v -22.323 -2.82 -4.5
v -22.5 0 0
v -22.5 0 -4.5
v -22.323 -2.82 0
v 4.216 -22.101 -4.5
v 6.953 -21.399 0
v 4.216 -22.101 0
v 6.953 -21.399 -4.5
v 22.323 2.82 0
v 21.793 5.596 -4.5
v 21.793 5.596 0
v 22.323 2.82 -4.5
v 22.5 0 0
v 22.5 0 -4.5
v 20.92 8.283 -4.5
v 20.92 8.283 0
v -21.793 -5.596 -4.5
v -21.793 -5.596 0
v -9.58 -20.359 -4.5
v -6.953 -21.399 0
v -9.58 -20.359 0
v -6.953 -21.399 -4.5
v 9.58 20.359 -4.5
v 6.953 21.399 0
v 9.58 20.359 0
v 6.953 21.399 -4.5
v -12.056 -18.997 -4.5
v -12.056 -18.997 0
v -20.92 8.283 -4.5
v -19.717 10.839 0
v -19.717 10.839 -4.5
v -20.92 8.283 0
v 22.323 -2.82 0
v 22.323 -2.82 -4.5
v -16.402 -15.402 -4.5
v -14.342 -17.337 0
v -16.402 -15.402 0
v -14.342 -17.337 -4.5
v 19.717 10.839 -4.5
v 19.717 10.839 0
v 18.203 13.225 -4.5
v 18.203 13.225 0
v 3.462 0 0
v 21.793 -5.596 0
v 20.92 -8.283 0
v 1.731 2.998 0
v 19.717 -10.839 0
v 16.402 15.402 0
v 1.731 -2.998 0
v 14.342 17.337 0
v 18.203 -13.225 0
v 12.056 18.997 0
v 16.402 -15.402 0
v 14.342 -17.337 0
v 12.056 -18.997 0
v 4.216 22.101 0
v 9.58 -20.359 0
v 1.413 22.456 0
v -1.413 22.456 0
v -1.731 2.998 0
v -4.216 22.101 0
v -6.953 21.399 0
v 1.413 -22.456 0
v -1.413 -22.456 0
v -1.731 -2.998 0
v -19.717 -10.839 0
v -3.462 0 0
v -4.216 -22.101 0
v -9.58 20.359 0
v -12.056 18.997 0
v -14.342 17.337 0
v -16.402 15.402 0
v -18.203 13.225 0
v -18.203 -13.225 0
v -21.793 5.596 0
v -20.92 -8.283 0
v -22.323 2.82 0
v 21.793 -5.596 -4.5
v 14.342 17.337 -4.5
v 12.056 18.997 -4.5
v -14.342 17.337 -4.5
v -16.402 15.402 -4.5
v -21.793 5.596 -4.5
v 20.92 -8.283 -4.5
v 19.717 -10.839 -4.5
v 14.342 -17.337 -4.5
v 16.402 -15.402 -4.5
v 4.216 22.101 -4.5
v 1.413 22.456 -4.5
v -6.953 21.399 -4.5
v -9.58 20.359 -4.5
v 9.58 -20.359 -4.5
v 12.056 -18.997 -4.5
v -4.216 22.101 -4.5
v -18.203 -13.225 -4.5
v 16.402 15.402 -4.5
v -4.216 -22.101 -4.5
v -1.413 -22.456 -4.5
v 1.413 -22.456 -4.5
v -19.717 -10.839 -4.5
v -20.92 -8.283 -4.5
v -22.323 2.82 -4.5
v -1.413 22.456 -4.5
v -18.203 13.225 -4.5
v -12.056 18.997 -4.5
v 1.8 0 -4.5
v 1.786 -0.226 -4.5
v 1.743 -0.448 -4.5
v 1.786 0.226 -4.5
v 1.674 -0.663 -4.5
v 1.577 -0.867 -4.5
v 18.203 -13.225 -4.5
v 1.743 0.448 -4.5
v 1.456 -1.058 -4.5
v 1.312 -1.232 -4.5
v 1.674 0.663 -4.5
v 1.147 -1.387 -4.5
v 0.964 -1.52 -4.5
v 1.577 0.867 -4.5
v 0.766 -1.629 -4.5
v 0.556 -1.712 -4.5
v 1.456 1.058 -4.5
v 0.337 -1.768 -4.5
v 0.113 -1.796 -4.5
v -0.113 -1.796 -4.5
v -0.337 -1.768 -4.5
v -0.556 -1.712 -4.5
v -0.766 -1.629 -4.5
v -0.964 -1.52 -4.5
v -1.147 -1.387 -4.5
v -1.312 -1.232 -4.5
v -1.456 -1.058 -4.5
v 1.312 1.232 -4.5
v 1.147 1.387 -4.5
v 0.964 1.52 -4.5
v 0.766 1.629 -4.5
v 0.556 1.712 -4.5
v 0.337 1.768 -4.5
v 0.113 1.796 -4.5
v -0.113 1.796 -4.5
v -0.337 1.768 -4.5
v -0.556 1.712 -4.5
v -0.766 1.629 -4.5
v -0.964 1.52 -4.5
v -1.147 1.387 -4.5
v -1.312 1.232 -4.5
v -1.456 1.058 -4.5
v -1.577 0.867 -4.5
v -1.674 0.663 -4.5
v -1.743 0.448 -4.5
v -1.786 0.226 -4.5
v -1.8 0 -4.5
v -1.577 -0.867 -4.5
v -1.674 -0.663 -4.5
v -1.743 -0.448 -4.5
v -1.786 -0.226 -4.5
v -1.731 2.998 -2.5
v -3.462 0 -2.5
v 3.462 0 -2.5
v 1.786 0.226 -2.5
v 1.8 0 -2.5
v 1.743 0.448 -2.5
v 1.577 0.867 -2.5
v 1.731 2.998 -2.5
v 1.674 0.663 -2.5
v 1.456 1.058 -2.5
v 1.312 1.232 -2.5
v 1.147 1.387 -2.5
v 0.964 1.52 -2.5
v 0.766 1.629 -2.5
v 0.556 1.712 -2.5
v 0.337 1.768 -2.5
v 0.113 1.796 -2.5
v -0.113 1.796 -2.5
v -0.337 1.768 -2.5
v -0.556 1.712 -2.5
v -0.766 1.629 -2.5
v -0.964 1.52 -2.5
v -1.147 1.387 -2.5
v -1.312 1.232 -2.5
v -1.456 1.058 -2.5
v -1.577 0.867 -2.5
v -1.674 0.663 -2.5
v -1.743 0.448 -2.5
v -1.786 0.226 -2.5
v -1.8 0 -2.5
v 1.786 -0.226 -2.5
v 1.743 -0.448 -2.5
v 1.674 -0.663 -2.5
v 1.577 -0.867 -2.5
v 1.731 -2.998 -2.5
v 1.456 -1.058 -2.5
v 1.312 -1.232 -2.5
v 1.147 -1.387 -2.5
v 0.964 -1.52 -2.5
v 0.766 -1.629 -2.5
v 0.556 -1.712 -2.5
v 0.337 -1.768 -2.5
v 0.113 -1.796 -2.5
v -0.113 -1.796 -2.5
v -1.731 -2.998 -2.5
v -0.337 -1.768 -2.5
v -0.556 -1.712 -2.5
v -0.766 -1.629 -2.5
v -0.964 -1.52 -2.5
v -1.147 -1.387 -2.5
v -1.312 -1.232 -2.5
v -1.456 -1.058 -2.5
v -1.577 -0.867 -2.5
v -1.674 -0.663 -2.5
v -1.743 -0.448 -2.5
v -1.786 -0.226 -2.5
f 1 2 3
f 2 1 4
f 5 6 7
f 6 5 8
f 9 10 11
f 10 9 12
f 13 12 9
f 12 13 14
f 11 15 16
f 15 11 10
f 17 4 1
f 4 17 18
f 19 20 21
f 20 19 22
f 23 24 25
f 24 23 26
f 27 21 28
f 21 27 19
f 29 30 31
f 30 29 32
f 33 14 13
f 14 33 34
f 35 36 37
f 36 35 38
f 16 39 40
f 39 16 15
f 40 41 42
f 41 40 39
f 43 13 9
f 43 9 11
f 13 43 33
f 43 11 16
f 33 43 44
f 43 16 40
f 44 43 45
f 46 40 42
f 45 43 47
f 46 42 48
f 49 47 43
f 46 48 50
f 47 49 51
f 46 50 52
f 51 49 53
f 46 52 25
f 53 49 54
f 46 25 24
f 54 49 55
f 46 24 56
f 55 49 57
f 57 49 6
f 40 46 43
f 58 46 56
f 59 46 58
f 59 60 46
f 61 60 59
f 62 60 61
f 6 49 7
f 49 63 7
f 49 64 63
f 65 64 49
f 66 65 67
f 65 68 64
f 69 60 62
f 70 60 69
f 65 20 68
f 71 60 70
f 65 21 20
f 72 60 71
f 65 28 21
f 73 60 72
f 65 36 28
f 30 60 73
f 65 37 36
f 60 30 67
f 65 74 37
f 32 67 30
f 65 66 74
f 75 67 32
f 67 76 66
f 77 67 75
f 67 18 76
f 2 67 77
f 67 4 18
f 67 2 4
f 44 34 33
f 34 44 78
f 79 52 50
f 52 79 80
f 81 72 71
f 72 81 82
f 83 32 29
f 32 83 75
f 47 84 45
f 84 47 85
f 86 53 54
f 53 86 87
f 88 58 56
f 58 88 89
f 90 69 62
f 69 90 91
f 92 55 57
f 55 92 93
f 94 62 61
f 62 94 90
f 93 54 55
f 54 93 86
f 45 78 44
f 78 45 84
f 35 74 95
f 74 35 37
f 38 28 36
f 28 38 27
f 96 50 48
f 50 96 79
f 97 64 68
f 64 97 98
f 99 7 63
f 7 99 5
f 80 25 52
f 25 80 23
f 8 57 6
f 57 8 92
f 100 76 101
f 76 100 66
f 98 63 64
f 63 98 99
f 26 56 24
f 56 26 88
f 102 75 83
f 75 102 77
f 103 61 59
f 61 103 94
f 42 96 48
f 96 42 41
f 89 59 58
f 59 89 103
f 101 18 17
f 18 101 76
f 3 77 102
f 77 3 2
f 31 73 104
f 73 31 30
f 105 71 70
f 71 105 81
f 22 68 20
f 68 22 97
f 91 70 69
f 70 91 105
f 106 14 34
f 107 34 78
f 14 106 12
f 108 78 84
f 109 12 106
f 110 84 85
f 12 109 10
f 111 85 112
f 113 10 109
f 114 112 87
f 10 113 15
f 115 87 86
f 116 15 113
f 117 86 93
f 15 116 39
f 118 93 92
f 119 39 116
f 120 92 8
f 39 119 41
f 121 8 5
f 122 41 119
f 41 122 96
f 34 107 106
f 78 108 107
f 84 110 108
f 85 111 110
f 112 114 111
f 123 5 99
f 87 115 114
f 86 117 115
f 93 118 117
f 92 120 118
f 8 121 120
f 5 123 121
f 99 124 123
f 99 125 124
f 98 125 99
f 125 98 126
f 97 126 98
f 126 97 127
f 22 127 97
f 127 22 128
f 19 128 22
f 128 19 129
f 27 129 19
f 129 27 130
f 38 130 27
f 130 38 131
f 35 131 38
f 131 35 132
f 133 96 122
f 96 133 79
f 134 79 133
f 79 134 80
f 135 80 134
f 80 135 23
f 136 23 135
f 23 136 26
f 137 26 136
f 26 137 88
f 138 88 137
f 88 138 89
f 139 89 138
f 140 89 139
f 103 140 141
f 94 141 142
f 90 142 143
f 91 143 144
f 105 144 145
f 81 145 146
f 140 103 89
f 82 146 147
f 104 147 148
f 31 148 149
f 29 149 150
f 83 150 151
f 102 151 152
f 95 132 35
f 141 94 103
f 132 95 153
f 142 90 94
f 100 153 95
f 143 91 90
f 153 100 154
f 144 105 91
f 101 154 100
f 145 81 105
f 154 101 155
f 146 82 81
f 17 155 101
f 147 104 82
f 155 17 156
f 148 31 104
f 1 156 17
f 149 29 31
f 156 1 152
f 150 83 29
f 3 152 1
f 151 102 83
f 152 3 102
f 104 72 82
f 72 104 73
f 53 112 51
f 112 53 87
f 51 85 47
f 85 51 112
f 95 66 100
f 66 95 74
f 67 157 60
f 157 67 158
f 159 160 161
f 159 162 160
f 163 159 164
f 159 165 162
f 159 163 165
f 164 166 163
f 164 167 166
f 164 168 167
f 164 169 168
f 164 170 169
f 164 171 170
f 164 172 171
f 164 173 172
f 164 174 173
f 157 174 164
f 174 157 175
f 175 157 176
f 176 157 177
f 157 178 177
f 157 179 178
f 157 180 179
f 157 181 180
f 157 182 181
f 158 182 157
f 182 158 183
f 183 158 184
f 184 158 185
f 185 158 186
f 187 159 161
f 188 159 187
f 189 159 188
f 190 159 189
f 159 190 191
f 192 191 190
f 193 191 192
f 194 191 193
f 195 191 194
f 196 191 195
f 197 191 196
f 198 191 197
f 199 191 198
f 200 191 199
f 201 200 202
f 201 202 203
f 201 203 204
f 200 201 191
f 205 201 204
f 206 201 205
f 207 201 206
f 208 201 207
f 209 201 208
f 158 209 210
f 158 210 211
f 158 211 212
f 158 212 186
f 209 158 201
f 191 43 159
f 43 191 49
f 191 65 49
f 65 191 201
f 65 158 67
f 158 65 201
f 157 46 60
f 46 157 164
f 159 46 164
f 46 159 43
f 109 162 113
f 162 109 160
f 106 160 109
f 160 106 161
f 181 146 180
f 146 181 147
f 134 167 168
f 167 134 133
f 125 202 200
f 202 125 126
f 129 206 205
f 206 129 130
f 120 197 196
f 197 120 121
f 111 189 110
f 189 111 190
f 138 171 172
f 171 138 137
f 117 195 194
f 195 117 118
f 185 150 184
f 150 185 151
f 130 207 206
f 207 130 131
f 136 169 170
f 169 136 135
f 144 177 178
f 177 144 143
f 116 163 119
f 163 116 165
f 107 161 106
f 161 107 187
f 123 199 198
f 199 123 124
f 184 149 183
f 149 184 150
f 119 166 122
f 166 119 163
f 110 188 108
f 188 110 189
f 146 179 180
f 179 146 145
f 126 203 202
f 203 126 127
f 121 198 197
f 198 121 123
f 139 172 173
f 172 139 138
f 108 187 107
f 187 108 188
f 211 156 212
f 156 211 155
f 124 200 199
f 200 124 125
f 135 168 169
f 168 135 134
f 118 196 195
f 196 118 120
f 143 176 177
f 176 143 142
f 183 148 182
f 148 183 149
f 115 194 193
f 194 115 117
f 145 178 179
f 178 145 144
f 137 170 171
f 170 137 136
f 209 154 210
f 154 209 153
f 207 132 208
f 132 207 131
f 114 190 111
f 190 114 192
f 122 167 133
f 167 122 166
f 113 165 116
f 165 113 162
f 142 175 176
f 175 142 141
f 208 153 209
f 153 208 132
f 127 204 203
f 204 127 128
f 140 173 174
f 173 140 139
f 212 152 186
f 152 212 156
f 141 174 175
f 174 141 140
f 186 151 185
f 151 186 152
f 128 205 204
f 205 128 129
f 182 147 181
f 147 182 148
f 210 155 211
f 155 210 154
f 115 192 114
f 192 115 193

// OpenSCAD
$fn = 50;


difference() {
	union() {
		translate(v = [0, 0, -4.5000000000]) {
			cylinder(h = 4.5000000000, r = 22.5000000000);
		}
		translate(v = [0, 0, -3.0000000000]) {
			cylinder(h = 3, r = 2.8750000000);
		}
	}
	union() {
		translate(v = [0, 0, 0]) {
			rotate(a = [0, 0, 0]) {
				difference() {
					union() {
						translate(v = [0, 0, -2.5000000000]) {
							linear_extrude(height = 2.5000000000) {
								polygon(points = [[3.4620000000, 0.0000000000], [1.7310000000, 2.9981799479], [-1.7310000000, 2.9981799479], [-3.4620000000, 0.0000000000], [-1.7310000000, -2.9981799479], [1.7310000000, -2.9981799479]]);
							}
						}
					}
					union();
				}
			}
		}
		#translate(v = [0, 0, -100.0000000000]) {
			cylinder(h = 200, r = 1.8000000000);
		}
	}
}
